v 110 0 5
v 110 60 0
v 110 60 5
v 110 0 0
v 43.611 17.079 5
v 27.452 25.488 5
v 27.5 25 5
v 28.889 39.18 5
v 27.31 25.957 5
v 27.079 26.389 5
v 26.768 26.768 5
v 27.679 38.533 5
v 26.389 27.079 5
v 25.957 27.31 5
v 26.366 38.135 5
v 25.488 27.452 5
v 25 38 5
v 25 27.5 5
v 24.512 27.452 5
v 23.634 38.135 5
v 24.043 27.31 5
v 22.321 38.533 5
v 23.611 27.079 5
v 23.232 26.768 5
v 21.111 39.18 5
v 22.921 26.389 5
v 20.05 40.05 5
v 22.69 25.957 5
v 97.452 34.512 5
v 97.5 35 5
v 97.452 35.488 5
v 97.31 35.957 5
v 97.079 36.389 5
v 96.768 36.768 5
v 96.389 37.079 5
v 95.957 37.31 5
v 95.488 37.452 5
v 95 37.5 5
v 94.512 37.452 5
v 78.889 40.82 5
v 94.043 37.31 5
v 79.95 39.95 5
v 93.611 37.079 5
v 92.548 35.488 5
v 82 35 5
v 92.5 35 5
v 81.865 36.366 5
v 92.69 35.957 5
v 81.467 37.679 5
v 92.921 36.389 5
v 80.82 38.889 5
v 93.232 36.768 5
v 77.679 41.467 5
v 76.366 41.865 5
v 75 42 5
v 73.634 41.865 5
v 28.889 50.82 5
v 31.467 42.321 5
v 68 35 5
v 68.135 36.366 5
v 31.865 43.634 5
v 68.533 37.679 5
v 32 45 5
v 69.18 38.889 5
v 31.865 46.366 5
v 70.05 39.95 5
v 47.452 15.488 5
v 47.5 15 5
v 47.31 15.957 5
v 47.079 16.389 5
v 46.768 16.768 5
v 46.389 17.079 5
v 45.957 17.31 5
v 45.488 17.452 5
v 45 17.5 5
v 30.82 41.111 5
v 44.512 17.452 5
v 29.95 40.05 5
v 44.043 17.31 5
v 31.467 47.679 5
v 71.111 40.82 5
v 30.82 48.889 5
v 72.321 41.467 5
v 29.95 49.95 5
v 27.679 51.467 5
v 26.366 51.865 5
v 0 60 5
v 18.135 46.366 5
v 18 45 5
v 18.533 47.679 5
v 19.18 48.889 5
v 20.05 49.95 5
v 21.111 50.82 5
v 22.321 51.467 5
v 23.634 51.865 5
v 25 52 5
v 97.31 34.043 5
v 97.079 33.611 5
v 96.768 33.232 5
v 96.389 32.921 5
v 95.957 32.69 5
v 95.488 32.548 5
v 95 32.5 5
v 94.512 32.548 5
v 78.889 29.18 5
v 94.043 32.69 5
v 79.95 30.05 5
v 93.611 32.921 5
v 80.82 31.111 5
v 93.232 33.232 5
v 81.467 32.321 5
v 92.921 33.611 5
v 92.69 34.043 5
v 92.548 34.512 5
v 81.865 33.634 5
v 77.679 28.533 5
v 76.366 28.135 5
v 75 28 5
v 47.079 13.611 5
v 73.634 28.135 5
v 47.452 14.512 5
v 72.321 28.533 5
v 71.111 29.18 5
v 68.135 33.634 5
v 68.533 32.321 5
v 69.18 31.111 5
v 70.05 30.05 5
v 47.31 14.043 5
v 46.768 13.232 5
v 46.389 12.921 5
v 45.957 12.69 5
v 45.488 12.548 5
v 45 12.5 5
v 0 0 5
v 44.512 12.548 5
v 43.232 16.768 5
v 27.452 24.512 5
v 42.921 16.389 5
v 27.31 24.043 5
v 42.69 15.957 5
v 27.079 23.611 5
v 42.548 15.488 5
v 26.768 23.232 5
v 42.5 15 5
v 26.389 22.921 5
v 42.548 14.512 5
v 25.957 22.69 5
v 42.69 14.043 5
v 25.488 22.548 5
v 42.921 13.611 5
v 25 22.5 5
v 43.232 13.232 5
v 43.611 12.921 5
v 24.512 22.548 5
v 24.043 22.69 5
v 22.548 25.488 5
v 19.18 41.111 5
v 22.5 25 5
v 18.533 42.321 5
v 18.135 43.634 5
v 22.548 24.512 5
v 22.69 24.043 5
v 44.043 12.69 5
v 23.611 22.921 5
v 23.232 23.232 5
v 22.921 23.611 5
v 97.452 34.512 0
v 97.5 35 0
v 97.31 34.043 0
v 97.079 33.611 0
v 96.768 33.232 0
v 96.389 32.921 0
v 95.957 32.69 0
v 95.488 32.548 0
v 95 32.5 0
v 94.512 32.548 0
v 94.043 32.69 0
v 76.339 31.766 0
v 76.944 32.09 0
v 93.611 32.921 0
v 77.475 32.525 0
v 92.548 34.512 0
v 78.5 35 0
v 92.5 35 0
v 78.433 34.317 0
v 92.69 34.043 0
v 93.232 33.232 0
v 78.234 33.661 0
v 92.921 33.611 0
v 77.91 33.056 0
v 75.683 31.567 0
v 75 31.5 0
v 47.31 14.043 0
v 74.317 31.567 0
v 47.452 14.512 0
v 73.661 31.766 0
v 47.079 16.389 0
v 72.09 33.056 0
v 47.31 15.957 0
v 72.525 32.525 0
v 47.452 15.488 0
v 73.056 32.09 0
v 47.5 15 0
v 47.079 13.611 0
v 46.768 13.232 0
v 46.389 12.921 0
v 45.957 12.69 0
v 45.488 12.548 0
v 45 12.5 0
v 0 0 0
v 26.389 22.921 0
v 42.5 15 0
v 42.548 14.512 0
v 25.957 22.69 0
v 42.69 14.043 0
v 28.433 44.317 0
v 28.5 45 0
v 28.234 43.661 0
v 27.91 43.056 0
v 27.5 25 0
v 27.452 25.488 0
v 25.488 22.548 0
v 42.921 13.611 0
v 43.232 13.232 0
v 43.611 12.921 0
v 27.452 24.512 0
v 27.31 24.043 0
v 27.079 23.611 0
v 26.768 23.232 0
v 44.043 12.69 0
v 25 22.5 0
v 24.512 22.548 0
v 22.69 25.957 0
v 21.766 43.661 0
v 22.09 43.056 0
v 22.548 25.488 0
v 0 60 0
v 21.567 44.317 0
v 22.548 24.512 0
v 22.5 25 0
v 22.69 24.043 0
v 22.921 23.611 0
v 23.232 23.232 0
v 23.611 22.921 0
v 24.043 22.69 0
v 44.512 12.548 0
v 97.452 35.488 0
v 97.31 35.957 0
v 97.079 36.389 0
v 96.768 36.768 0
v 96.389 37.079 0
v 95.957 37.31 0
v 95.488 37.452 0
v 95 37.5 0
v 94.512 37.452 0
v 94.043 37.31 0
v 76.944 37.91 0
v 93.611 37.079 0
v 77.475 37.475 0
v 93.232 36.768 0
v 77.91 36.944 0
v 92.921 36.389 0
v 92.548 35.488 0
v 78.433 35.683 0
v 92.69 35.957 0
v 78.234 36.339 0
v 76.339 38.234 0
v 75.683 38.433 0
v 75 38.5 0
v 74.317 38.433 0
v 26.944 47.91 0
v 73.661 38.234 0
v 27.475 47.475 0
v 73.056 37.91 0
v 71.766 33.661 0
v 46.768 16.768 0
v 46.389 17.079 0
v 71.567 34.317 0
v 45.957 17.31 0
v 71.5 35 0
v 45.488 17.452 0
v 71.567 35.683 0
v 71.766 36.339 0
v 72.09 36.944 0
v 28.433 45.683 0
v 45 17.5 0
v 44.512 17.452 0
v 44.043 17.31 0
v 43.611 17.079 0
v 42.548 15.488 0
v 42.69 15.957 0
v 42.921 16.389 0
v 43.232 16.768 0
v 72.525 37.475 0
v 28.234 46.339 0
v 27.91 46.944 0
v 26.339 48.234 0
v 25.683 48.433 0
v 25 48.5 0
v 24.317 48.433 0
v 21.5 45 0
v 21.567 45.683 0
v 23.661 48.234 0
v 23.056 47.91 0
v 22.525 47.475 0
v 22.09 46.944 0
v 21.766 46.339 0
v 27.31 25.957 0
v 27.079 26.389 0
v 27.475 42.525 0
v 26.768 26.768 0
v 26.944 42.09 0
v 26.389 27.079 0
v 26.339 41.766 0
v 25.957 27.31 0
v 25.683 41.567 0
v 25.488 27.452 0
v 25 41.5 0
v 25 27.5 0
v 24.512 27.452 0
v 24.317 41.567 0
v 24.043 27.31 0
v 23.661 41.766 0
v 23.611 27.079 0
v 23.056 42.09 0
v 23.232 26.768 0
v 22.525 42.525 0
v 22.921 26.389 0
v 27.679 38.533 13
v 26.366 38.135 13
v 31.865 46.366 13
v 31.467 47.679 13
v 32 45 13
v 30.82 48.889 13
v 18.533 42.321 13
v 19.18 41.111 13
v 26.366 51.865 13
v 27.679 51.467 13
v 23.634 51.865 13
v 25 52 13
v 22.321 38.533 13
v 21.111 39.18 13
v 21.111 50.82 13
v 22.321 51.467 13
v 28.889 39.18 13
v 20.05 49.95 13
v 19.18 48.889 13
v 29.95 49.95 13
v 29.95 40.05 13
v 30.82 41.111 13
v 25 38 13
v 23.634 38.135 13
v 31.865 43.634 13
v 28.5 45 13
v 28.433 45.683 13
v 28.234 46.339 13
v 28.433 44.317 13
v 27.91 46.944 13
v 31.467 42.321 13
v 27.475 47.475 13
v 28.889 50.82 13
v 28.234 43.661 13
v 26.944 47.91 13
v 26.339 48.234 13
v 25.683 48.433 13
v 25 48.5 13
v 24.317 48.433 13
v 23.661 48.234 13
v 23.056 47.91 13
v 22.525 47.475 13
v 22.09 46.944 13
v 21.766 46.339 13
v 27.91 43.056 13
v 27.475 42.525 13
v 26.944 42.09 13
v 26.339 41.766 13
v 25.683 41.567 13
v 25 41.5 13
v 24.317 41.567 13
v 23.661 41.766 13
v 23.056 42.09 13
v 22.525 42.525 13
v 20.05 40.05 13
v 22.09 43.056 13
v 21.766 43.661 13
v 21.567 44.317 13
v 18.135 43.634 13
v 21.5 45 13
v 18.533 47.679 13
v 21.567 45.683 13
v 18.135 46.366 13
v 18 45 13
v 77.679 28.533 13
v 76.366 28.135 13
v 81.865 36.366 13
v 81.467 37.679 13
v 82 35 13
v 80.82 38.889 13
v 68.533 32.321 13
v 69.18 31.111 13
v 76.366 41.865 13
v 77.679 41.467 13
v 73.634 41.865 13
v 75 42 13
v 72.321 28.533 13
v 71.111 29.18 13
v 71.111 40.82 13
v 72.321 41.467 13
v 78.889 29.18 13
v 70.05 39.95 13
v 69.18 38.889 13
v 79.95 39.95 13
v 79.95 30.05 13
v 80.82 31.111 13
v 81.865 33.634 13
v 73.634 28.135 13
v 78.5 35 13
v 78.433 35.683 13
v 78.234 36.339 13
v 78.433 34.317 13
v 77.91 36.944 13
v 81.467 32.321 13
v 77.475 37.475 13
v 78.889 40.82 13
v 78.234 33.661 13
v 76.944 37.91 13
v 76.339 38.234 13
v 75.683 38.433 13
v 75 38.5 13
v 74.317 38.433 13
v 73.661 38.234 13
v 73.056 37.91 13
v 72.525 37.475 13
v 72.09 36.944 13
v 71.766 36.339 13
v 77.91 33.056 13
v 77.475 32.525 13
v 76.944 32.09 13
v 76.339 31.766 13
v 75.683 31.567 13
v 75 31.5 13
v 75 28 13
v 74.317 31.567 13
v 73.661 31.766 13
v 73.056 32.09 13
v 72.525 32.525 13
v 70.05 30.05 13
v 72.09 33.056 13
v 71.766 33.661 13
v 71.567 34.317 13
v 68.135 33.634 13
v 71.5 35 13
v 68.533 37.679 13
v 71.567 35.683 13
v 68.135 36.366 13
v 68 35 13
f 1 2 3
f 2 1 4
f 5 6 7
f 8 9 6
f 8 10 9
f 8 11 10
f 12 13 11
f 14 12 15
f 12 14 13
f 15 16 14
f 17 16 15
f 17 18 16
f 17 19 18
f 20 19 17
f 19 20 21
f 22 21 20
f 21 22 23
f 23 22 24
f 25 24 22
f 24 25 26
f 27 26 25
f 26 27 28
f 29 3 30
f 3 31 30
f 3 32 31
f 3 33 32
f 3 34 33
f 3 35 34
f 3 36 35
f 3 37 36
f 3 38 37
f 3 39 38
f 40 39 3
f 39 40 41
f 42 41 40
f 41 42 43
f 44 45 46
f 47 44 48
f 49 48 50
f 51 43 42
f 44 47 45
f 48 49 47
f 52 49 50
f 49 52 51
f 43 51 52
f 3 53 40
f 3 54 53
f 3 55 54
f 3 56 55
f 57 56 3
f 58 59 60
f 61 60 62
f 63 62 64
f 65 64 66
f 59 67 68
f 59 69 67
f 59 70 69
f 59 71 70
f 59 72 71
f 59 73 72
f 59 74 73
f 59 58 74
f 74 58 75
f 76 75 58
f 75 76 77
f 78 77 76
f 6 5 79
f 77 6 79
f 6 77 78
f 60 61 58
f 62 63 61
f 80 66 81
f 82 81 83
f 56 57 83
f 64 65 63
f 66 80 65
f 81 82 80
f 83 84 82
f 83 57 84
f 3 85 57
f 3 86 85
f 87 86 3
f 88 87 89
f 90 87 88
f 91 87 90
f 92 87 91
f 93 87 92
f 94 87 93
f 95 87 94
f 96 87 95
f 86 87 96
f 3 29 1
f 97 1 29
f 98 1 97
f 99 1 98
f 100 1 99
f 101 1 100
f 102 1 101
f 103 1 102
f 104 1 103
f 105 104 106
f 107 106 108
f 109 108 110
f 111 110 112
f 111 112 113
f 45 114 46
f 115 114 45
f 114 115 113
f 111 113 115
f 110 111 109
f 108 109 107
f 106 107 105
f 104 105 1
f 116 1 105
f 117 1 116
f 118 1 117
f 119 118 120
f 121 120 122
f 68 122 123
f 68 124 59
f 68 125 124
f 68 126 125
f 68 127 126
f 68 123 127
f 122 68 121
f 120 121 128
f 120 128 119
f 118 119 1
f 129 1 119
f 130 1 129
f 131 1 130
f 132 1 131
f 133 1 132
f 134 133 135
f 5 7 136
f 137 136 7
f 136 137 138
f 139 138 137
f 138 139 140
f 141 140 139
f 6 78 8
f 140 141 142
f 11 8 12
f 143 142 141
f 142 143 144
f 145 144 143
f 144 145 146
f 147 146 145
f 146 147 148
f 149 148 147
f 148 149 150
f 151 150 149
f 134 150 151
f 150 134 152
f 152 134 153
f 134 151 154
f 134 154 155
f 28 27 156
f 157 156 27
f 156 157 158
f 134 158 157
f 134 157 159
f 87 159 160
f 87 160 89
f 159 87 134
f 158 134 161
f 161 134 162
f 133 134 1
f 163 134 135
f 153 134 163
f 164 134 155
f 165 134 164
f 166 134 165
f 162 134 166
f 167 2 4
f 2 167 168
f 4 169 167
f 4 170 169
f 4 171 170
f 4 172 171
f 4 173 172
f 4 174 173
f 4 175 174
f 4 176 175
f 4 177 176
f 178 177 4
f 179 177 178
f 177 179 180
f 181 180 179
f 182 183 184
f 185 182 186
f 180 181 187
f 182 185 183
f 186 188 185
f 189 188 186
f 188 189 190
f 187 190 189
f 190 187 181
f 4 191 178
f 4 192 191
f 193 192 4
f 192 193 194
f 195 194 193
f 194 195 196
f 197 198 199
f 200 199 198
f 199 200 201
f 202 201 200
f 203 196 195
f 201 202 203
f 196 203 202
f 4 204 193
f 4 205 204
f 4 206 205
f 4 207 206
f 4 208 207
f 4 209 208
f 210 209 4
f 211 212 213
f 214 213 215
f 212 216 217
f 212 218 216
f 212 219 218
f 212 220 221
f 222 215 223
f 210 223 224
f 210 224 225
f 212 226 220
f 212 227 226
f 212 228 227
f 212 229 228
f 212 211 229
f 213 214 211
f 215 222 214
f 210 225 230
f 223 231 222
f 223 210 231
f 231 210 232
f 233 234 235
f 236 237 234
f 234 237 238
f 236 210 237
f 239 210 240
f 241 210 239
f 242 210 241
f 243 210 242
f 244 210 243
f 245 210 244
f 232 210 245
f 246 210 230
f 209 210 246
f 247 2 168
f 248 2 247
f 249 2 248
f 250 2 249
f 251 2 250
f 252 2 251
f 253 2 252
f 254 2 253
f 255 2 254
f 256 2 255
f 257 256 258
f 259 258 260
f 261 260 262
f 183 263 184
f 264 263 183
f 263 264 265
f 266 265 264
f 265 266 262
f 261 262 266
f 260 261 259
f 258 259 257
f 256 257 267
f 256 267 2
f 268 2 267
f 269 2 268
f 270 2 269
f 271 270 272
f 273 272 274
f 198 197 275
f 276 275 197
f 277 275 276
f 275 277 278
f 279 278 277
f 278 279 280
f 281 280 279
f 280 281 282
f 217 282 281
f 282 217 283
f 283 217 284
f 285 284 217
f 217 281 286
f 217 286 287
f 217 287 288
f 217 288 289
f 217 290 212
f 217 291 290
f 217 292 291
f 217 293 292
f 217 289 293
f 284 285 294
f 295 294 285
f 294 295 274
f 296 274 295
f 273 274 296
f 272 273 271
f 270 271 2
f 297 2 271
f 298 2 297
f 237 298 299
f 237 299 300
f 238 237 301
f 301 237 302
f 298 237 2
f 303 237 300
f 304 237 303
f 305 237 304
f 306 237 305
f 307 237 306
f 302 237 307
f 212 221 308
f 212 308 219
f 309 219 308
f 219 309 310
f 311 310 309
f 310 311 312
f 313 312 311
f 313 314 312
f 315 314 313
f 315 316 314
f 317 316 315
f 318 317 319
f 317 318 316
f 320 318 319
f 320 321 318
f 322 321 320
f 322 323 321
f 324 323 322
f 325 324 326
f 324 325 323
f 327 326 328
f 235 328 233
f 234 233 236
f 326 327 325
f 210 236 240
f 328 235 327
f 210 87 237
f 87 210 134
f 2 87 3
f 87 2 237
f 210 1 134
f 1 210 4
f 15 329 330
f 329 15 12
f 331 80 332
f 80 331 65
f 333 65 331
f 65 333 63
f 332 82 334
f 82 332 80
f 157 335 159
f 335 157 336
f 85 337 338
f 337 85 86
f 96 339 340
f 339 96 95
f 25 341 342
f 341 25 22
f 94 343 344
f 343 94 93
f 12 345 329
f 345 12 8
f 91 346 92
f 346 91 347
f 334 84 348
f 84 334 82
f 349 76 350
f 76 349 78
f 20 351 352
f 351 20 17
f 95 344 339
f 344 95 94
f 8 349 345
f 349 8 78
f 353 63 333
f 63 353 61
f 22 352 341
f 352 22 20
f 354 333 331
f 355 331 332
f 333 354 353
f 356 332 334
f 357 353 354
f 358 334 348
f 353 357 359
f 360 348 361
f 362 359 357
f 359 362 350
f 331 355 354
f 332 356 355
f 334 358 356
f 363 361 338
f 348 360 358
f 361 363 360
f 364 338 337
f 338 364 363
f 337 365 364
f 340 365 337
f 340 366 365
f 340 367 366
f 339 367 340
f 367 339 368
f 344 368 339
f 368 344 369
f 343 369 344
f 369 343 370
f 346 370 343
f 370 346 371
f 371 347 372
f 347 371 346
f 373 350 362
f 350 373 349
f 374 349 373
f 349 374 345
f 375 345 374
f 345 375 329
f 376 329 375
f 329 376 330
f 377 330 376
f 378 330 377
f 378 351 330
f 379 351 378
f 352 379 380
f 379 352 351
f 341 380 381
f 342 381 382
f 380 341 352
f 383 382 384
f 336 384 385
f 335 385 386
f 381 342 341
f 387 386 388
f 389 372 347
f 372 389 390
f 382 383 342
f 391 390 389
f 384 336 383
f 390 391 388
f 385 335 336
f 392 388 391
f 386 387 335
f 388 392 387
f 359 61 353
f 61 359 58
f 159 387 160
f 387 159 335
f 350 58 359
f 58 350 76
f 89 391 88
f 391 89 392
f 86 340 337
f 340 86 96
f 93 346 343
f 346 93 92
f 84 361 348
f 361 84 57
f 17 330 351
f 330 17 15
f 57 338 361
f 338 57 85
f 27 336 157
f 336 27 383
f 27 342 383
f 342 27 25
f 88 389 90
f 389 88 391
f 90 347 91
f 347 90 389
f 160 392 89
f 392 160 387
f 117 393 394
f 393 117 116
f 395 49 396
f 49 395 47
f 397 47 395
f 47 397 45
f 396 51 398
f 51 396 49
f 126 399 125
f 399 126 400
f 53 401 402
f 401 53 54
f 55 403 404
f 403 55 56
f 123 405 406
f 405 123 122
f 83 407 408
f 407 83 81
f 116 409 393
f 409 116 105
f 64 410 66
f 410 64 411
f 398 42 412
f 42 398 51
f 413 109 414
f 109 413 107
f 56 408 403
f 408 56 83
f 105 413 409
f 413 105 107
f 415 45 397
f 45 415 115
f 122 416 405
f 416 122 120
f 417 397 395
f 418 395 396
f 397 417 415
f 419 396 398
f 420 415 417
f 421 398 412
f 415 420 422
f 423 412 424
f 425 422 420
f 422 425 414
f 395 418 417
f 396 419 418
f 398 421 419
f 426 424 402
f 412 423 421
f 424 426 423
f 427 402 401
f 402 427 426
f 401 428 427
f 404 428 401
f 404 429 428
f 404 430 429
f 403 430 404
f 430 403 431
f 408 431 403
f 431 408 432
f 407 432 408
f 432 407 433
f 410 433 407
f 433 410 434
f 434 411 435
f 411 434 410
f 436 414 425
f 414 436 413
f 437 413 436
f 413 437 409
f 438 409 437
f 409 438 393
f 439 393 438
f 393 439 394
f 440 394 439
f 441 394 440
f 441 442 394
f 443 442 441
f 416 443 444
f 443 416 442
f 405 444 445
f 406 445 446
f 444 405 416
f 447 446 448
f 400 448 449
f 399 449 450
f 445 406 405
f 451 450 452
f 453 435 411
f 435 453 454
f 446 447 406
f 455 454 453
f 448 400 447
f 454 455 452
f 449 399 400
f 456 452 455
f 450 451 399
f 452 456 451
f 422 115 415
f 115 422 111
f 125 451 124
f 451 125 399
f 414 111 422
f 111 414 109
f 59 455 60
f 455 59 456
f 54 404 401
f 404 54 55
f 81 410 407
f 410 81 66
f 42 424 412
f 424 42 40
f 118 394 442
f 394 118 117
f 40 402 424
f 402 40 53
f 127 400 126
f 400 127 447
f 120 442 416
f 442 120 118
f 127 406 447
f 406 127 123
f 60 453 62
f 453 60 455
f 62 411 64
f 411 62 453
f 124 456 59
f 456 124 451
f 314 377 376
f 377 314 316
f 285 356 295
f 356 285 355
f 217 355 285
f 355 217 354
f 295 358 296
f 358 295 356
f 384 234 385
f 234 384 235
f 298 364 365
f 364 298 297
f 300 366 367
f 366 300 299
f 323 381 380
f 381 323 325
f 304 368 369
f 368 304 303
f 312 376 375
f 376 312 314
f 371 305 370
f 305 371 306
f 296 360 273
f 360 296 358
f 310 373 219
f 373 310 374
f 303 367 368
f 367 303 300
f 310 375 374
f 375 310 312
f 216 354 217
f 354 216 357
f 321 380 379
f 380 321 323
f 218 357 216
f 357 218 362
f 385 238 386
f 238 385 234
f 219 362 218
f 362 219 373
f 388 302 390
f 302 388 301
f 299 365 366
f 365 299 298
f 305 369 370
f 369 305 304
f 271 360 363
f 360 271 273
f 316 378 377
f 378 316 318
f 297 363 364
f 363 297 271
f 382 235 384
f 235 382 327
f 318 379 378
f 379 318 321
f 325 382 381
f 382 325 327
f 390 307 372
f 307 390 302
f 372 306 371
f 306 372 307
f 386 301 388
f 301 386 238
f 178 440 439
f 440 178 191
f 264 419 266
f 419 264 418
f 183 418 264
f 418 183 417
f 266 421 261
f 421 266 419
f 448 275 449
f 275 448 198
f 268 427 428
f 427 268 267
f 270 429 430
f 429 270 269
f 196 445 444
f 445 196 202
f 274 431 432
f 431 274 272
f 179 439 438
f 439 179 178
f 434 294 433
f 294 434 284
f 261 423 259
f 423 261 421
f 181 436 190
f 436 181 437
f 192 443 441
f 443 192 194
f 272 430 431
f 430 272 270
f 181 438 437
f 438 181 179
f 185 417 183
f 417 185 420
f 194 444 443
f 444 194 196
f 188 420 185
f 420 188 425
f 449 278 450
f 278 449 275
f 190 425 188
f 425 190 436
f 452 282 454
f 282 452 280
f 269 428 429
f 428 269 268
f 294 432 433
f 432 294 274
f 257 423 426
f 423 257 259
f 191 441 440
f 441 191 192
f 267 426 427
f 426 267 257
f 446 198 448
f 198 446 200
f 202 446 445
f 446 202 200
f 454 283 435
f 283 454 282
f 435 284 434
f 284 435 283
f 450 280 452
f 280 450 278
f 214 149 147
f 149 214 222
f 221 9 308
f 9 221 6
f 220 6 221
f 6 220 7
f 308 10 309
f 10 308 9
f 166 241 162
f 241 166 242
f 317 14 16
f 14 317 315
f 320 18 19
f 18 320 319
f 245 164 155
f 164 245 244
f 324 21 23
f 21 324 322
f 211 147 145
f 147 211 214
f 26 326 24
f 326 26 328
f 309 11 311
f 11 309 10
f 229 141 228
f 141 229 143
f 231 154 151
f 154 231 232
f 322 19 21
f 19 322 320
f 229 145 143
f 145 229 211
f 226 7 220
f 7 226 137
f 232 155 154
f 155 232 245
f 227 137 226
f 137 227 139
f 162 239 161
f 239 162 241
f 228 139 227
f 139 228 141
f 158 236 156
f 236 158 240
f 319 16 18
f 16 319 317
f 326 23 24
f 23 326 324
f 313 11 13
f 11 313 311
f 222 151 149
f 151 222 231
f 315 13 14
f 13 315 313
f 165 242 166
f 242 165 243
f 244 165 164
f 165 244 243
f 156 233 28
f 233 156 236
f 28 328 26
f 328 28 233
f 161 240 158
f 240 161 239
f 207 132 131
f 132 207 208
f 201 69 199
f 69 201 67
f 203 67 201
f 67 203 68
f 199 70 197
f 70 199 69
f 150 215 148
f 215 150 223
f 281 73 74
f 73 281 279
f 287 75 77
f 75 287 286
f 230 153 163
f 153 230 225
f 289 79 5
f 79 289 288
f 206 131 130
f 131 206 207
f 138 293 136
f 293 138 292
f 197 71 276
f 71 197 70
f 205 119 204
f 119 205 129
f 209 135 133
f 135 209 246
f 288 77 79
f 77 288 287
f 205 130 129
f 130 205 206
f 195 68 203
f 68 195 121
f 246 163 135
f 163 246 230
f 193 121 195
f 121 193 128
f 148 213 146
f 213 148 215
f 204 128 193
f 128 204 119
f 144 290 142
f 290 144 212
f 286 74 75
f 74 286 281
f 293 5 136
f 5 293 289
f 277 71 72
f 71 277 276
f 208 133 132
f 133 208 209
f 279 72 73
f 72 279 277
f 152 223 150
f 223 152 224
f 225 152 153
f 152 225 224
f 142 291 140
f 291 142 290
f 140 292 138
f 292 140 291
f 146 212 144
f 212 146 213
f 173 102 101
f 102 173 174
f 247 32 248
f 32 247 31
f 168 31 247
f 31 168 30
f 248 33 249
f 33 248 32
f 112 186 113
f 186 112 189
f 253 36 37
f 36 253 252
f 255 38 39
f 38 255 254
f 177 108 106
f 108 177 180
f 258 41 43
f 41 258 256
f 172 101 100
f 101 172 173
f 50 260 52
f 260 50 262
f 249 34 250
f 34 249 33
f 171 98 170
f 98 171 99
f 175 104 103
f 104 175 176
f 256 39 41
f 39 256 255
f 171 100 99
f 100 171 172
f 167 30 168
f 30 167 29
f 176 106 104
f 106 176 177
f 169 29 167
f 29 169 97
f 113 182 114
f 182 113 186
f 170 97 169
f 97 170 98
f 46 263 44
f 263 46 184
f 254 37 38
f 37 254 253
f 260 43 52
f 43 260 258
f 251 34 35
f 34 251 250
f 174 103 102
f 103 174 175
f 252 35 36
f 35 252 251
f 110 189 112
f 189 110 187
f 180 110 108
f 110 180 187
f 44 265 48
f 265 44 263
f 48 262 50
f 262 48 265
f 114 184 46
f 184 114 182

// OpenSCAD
$fn = 32;

// ----------------------------------------------------------------------
// Mixed field: bosses and holes at given coordinates
// ----------------------------------------------------------------------

// --- parameters (mm) ---
plate_l = 110;            // plate length, X
plate_w = 60;             // plate width, Y
plate_t = 5;              // plate thickness, Z
boss_d = 14;              // boss diameter
boss_h = 8;               // boss height above the plate
hole_d = 5;               // through hole diameter
fit_tol = 0.1;            // tolerance for press fits, mm
free_tol = 0.5;           // tolerance for clearance fits, mm

total_h = plate_t + boss_h;  // overall height

difference() {
  union() {
    cube([plate_l, plate_w, plate_t]);
    translate([25, 45, plate_t]) cylinder(h = boss_h, d = boss_d);
    translate([75, 35, plate_t]) cylinder(h = boss_h, d = boss_d);
  }
  translate([25, 45, -1]) cylinder(h = total_h + 2, d = boss_d / 2);
  translate([75, 35, -1]) cylinder(h = total_h + 2, d = boss_d / 2);
  translate([25, 25, -1]) cylinder(h = plate_t + 2, d = hole_d);
  translate([45, 15, -1]) cylinder(h = plate_t + 2, d = hole_d);
  translate([95, 35, -1]) cylinder(h = plate_t + 2, d = hole_d);
}
